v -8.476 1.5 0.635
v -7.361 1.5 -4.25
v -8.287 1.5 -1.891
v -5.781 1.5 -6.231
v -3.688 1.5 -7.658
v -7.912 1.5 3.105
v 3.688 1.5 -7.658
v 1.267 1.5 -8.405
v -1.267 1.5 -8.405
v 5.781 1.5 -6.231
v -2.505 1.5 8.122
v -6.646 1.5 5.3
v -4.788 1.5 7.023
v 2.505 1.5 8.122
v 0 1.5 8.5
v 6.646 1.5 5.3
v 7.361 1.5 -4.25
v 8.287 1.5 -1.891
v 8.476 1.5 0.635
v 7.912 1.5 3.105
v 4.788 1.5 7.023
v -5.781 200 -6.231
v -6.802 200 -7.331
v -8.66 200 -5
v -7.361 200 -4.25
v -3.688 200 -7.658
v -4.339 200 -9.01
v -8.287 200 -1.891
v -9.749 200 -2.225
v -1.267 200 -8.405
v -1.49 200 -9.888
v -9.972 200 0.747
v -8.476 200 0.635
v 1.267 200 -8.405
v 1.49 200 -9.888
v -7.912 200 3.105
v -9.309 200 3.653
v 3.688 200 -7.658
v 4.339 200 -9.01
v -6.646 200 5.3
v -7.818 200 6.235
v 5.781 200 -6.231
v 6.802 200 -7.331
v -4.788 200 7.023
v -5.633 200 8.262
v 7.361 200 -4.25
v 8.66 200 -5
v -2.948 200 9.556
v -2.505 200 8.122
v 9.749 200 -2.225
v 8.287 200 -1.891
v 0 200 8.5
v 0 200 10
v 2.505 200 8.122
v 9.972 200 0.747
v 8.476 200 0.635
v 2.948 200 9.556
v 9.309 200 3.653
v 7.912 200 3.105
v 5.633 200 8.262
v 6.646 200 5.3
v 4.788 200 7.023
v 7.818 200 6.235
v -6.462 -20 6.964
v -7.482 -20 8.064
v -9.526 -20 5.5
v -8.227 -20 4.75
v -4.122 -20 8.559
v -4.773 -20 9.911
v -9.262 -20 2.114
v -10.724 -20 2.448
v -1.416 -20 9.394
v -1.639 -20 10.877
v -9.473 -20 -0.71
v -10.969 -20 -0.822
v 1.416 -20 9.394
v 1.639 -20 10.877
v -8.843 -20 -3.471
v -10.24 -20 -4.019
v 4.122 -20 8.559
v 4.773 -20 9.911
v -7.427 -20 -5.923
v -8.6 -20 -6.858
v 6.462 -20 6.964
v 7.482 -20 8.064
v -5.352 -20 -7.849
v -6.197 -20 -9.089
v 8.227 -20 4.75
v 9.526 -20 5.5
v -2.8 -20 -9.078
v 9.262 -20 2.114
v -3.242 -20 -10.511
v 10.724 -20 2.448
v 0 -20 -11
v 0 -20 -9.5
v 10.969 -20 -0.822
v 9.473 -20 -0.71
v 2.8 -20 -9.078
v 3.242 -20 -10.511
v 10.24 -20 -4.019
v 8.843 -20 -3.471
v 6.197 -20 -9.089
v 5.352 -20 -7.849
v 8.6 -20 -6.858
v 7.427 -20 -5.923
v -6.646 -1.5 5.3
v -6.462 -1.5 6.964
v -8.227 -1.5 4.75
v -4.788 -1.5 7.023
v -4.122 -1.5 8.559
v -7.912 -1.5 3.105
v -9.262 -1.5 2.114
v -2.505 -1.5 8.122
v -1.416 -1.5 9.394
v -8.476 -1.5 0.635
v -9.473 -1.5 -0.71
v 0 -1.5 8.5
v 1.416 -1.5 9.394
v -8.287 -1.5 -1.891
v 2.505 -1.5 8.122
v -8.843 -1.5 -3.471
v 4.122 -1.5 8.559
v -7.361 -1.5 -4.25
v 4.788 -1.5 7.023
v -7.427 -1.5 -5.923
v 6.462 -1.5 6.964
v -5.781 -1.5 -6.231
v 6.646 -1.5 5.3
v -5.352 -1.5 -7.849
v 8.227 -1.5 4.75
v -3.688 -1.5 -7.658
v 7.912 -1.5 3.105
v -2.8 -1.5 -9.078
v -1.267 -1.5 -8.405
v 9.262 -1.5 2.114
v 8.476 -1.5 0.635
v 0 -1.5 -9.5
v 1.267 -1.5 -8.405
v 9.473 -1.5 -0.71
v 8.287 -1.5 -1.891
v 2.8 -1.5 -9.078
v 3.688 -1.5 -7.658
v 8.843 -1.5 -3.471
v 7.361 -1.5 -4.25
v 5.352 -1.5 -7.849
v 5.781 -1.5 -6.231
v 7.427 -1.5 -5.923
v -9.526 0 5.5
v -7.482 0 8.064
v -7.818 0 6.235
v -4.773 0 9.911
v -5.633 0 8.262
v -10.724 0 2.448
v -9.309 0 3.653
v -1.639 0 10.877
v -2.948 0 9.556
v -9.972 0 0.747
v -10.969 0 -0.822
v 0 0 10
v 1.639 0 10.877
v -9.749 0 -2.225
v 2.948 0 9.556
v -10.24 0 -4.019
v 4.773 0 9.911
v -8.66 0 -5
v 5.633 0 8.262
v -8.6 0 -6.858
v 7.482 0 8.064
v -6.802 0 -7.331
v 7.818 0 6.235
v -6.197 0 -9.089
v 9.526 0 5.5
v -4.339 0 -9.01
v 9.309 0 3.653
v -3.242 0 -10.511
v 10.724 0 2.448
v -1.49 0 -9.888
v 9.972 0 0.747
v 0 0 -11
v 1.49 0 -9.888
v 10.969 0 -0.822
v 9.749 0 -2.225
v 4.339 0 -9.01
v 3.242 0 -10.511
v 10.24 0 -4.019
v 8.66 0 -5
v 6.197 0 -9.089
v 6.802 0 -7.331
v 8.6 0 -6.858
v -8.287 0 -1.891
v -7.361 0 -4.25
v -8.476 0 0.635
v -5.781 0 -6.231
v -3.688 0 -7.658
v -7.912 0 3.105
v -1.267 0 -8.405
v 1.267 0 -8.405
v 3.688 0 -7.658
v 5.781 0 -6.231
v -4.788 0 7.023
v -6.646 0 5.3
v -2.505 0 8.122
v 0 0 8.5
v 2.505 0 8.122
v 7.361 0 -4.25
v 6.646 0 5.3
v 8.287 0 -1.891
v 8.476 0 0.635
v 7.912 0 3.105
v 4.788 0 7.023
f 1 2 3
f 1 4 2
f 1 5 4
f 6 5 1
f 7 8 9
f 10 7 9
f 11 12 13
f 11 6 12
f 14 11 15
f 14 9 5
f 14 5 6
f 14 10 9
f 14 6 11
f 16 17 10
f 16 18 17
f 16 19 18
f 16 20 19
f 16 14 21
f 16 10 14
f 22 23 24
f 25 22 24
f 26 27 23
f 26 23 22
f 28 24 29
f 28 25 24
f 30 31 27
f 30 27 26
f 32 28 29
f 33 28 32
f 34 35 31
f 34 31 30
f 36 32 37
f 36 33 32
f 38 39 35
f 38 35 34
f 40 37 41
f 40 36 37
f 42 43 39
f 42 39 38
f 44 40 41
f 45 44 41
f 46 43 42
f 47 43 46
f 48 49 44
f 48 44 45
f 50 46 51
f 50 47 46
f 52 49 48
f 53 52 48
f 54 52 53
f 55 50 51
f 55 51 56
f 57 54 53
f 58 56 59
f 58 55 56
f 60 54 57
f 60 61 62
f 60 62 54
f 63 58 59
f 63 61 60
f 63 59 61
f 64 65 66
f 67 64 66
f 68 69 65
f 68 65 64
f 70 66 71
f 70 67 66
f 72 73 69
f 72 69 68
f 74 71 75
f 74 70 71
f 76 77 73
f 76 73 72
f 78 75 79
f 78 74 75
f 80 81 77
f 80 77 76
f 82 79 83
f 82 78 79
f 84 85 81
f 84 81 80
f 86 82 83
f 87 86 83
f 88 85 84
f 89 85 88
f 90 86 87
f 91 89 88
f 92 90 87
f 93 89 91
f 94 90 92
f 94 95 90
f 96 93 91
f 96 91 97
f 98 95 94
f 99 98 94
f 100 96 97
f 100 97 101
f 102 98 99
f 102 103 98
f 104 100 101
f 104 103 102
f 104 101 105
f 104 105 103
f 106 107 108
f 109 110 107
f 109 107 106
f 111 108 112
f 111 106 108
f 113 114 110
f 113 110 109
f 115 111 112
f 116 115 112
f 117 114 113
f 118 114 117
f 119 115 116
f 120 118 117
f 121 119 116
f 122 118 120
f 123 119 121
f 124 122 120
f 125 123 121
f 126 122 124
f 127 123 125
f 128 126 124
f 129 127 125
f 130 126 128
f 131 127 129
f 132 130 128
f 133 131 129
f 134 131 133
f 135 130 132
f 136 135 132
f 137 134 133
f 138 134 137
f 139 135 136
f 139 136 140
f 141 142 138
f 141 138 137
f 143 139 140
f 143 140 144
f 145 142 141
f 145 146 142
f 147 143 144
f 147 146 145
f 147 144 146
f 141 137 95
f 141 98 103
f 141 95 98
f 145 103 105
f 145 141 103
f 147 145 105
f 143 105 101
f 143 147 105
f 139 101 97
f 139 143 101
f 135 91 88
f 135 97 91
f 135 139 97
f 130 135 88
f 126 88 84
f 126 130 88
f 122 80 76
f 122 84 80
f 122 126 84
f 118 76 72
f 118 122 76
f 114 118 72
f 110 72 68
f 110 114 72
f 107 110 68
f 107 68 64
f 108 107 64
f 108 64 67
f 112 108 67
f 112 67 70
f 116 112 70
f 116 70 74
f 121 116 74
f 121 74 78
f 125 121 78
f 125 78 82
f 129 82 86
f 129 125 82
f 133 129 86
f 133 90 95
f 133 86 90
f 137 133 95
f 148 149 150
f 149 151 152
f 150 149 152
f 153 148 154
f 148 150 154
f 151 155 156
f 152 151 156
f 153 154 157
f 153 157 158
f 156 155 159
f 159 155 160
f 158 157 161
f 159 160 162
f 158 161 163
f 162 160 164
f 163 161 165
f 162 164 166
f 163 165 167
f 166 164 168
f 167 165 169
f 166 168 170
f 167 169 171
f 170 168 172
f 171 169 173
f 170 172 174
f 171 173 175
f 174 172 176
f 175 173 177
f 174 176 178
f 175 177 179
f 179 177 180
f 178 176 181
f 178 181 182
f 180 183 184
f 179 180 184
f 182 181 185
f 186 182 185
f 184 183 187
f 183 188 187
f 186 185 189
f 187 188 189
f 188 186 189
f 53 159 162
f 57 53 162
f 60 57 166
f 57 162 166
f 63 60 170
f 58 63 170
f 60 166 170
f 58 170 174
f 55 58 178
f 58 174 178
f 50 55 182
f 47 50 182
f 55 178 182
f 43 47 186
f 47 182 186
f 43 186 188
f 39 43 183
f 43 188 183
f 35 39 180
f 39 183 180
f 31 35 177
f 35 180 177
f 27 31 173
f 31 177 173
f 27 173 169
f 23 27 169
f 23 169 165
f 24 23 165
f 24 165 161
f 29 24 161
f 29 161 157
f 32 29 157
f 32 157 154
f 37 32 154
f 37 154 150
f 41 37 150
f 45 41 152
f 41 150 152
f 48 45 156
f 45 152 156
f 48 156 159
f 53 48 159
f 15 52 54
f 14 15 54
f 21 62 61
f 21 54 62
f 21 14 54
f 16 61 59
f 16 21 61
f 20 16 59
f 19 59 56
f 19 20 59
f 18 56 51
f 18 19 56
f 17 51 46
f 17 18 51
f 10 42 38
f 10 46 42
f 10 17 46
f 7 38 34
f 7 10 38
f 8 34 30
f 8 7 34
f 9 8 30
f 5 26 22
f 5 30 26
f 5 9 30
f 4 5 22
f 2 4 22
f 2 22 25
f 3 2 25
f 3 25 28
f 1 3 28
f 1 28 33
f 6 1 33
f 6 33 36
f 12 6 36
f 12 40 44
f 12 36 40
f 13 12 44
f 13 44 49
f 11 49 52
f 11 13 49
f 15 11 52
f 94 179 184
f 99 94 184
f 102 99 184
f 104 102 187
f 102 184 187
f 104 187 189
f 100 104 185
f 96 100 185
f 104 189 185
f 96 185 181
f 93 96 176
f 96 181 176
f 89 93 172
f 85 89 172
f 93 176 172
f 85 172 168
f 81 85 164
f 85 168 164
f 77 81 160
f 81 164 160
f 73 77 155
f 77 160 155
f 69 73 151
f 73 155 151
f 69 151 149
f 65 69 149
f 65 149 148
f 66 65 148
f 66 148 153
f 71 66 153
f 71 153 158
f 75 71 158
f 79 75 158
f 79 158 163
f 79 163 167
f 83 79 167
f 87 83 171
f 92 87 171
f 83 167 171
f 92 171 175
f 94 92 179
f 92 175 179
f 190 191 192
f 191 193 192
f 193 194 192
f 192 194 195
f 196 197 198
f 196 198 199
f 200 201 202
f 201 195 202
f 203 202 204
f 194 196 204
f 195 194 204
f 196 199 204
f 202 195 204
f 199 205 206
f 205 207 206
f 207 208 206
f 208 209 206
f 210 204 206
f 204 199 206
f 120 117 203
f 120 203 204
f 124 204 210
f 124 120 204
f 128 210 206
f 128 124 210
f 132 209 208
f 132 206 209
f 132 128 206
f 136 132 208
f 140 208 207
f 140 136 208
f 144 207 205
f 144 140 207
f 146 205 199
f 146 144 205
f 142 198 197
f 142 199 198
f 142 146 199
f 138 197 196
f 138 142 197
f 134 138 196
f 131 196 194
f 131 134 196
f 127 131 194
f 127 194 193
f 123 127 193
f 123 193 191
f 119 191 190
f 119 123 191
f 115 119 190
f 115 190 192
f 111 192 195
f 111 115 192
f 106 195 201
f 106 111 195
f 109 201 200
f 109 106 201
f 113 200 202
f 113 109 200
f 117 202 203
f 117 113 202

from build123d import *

# Parameters (mm, degrees)
SKETCH1_R           = 10
BOSS_EXTRUDE1_DEPTH = 200
SHELL1_T            = -1.5
SKETCH2_R           = 11
BOSS_EXTRUDE2_DEPTH = 20
SHELL2_T            = -1.5


with BuildPart() as part:
    # Sketch1 → Boss-Extrude1 (new body)
    with BuildSketch(Plane(origin=(0, 0, 0), x_dir=(1, 0, 0), z_dir=(0, 1, 0))):
        with Locations(Location((0, 0, 0), (0, 0, 270))):
            Circle(SKETCH1_R)
    extrude(amount=BOSS_EXTRUDE1_DEPTH)

    # Shell1
    shell1_openings = [part.faces().sort_by_distance(p)[0] for p in [
        (0, 200, 0),
    ]]
    offset(amount=SHELL1_T, openings=shell1_openings, kind=Kind.INTERSECTION)

    # Sketch2 → Boss-Extrude2 (add)
    with BuildSketch(Plane.XZ):
        with Locations(Location((0, 0, 0), (0, 0, 270))):
            Circle(SKETCH2_R)
    extrude(amount=BOSS_EXTRUDE2_DEPTH)

    # Shell2
    shell2_openings = [part.faces().sort_by_distance(p)[0] for p in [
        (0, -20, 0),
    ]]
    offset(amount=SHELL2_T, openings=shell2_openings, kind=Kind.INTERSECTION)


solid = part.part
